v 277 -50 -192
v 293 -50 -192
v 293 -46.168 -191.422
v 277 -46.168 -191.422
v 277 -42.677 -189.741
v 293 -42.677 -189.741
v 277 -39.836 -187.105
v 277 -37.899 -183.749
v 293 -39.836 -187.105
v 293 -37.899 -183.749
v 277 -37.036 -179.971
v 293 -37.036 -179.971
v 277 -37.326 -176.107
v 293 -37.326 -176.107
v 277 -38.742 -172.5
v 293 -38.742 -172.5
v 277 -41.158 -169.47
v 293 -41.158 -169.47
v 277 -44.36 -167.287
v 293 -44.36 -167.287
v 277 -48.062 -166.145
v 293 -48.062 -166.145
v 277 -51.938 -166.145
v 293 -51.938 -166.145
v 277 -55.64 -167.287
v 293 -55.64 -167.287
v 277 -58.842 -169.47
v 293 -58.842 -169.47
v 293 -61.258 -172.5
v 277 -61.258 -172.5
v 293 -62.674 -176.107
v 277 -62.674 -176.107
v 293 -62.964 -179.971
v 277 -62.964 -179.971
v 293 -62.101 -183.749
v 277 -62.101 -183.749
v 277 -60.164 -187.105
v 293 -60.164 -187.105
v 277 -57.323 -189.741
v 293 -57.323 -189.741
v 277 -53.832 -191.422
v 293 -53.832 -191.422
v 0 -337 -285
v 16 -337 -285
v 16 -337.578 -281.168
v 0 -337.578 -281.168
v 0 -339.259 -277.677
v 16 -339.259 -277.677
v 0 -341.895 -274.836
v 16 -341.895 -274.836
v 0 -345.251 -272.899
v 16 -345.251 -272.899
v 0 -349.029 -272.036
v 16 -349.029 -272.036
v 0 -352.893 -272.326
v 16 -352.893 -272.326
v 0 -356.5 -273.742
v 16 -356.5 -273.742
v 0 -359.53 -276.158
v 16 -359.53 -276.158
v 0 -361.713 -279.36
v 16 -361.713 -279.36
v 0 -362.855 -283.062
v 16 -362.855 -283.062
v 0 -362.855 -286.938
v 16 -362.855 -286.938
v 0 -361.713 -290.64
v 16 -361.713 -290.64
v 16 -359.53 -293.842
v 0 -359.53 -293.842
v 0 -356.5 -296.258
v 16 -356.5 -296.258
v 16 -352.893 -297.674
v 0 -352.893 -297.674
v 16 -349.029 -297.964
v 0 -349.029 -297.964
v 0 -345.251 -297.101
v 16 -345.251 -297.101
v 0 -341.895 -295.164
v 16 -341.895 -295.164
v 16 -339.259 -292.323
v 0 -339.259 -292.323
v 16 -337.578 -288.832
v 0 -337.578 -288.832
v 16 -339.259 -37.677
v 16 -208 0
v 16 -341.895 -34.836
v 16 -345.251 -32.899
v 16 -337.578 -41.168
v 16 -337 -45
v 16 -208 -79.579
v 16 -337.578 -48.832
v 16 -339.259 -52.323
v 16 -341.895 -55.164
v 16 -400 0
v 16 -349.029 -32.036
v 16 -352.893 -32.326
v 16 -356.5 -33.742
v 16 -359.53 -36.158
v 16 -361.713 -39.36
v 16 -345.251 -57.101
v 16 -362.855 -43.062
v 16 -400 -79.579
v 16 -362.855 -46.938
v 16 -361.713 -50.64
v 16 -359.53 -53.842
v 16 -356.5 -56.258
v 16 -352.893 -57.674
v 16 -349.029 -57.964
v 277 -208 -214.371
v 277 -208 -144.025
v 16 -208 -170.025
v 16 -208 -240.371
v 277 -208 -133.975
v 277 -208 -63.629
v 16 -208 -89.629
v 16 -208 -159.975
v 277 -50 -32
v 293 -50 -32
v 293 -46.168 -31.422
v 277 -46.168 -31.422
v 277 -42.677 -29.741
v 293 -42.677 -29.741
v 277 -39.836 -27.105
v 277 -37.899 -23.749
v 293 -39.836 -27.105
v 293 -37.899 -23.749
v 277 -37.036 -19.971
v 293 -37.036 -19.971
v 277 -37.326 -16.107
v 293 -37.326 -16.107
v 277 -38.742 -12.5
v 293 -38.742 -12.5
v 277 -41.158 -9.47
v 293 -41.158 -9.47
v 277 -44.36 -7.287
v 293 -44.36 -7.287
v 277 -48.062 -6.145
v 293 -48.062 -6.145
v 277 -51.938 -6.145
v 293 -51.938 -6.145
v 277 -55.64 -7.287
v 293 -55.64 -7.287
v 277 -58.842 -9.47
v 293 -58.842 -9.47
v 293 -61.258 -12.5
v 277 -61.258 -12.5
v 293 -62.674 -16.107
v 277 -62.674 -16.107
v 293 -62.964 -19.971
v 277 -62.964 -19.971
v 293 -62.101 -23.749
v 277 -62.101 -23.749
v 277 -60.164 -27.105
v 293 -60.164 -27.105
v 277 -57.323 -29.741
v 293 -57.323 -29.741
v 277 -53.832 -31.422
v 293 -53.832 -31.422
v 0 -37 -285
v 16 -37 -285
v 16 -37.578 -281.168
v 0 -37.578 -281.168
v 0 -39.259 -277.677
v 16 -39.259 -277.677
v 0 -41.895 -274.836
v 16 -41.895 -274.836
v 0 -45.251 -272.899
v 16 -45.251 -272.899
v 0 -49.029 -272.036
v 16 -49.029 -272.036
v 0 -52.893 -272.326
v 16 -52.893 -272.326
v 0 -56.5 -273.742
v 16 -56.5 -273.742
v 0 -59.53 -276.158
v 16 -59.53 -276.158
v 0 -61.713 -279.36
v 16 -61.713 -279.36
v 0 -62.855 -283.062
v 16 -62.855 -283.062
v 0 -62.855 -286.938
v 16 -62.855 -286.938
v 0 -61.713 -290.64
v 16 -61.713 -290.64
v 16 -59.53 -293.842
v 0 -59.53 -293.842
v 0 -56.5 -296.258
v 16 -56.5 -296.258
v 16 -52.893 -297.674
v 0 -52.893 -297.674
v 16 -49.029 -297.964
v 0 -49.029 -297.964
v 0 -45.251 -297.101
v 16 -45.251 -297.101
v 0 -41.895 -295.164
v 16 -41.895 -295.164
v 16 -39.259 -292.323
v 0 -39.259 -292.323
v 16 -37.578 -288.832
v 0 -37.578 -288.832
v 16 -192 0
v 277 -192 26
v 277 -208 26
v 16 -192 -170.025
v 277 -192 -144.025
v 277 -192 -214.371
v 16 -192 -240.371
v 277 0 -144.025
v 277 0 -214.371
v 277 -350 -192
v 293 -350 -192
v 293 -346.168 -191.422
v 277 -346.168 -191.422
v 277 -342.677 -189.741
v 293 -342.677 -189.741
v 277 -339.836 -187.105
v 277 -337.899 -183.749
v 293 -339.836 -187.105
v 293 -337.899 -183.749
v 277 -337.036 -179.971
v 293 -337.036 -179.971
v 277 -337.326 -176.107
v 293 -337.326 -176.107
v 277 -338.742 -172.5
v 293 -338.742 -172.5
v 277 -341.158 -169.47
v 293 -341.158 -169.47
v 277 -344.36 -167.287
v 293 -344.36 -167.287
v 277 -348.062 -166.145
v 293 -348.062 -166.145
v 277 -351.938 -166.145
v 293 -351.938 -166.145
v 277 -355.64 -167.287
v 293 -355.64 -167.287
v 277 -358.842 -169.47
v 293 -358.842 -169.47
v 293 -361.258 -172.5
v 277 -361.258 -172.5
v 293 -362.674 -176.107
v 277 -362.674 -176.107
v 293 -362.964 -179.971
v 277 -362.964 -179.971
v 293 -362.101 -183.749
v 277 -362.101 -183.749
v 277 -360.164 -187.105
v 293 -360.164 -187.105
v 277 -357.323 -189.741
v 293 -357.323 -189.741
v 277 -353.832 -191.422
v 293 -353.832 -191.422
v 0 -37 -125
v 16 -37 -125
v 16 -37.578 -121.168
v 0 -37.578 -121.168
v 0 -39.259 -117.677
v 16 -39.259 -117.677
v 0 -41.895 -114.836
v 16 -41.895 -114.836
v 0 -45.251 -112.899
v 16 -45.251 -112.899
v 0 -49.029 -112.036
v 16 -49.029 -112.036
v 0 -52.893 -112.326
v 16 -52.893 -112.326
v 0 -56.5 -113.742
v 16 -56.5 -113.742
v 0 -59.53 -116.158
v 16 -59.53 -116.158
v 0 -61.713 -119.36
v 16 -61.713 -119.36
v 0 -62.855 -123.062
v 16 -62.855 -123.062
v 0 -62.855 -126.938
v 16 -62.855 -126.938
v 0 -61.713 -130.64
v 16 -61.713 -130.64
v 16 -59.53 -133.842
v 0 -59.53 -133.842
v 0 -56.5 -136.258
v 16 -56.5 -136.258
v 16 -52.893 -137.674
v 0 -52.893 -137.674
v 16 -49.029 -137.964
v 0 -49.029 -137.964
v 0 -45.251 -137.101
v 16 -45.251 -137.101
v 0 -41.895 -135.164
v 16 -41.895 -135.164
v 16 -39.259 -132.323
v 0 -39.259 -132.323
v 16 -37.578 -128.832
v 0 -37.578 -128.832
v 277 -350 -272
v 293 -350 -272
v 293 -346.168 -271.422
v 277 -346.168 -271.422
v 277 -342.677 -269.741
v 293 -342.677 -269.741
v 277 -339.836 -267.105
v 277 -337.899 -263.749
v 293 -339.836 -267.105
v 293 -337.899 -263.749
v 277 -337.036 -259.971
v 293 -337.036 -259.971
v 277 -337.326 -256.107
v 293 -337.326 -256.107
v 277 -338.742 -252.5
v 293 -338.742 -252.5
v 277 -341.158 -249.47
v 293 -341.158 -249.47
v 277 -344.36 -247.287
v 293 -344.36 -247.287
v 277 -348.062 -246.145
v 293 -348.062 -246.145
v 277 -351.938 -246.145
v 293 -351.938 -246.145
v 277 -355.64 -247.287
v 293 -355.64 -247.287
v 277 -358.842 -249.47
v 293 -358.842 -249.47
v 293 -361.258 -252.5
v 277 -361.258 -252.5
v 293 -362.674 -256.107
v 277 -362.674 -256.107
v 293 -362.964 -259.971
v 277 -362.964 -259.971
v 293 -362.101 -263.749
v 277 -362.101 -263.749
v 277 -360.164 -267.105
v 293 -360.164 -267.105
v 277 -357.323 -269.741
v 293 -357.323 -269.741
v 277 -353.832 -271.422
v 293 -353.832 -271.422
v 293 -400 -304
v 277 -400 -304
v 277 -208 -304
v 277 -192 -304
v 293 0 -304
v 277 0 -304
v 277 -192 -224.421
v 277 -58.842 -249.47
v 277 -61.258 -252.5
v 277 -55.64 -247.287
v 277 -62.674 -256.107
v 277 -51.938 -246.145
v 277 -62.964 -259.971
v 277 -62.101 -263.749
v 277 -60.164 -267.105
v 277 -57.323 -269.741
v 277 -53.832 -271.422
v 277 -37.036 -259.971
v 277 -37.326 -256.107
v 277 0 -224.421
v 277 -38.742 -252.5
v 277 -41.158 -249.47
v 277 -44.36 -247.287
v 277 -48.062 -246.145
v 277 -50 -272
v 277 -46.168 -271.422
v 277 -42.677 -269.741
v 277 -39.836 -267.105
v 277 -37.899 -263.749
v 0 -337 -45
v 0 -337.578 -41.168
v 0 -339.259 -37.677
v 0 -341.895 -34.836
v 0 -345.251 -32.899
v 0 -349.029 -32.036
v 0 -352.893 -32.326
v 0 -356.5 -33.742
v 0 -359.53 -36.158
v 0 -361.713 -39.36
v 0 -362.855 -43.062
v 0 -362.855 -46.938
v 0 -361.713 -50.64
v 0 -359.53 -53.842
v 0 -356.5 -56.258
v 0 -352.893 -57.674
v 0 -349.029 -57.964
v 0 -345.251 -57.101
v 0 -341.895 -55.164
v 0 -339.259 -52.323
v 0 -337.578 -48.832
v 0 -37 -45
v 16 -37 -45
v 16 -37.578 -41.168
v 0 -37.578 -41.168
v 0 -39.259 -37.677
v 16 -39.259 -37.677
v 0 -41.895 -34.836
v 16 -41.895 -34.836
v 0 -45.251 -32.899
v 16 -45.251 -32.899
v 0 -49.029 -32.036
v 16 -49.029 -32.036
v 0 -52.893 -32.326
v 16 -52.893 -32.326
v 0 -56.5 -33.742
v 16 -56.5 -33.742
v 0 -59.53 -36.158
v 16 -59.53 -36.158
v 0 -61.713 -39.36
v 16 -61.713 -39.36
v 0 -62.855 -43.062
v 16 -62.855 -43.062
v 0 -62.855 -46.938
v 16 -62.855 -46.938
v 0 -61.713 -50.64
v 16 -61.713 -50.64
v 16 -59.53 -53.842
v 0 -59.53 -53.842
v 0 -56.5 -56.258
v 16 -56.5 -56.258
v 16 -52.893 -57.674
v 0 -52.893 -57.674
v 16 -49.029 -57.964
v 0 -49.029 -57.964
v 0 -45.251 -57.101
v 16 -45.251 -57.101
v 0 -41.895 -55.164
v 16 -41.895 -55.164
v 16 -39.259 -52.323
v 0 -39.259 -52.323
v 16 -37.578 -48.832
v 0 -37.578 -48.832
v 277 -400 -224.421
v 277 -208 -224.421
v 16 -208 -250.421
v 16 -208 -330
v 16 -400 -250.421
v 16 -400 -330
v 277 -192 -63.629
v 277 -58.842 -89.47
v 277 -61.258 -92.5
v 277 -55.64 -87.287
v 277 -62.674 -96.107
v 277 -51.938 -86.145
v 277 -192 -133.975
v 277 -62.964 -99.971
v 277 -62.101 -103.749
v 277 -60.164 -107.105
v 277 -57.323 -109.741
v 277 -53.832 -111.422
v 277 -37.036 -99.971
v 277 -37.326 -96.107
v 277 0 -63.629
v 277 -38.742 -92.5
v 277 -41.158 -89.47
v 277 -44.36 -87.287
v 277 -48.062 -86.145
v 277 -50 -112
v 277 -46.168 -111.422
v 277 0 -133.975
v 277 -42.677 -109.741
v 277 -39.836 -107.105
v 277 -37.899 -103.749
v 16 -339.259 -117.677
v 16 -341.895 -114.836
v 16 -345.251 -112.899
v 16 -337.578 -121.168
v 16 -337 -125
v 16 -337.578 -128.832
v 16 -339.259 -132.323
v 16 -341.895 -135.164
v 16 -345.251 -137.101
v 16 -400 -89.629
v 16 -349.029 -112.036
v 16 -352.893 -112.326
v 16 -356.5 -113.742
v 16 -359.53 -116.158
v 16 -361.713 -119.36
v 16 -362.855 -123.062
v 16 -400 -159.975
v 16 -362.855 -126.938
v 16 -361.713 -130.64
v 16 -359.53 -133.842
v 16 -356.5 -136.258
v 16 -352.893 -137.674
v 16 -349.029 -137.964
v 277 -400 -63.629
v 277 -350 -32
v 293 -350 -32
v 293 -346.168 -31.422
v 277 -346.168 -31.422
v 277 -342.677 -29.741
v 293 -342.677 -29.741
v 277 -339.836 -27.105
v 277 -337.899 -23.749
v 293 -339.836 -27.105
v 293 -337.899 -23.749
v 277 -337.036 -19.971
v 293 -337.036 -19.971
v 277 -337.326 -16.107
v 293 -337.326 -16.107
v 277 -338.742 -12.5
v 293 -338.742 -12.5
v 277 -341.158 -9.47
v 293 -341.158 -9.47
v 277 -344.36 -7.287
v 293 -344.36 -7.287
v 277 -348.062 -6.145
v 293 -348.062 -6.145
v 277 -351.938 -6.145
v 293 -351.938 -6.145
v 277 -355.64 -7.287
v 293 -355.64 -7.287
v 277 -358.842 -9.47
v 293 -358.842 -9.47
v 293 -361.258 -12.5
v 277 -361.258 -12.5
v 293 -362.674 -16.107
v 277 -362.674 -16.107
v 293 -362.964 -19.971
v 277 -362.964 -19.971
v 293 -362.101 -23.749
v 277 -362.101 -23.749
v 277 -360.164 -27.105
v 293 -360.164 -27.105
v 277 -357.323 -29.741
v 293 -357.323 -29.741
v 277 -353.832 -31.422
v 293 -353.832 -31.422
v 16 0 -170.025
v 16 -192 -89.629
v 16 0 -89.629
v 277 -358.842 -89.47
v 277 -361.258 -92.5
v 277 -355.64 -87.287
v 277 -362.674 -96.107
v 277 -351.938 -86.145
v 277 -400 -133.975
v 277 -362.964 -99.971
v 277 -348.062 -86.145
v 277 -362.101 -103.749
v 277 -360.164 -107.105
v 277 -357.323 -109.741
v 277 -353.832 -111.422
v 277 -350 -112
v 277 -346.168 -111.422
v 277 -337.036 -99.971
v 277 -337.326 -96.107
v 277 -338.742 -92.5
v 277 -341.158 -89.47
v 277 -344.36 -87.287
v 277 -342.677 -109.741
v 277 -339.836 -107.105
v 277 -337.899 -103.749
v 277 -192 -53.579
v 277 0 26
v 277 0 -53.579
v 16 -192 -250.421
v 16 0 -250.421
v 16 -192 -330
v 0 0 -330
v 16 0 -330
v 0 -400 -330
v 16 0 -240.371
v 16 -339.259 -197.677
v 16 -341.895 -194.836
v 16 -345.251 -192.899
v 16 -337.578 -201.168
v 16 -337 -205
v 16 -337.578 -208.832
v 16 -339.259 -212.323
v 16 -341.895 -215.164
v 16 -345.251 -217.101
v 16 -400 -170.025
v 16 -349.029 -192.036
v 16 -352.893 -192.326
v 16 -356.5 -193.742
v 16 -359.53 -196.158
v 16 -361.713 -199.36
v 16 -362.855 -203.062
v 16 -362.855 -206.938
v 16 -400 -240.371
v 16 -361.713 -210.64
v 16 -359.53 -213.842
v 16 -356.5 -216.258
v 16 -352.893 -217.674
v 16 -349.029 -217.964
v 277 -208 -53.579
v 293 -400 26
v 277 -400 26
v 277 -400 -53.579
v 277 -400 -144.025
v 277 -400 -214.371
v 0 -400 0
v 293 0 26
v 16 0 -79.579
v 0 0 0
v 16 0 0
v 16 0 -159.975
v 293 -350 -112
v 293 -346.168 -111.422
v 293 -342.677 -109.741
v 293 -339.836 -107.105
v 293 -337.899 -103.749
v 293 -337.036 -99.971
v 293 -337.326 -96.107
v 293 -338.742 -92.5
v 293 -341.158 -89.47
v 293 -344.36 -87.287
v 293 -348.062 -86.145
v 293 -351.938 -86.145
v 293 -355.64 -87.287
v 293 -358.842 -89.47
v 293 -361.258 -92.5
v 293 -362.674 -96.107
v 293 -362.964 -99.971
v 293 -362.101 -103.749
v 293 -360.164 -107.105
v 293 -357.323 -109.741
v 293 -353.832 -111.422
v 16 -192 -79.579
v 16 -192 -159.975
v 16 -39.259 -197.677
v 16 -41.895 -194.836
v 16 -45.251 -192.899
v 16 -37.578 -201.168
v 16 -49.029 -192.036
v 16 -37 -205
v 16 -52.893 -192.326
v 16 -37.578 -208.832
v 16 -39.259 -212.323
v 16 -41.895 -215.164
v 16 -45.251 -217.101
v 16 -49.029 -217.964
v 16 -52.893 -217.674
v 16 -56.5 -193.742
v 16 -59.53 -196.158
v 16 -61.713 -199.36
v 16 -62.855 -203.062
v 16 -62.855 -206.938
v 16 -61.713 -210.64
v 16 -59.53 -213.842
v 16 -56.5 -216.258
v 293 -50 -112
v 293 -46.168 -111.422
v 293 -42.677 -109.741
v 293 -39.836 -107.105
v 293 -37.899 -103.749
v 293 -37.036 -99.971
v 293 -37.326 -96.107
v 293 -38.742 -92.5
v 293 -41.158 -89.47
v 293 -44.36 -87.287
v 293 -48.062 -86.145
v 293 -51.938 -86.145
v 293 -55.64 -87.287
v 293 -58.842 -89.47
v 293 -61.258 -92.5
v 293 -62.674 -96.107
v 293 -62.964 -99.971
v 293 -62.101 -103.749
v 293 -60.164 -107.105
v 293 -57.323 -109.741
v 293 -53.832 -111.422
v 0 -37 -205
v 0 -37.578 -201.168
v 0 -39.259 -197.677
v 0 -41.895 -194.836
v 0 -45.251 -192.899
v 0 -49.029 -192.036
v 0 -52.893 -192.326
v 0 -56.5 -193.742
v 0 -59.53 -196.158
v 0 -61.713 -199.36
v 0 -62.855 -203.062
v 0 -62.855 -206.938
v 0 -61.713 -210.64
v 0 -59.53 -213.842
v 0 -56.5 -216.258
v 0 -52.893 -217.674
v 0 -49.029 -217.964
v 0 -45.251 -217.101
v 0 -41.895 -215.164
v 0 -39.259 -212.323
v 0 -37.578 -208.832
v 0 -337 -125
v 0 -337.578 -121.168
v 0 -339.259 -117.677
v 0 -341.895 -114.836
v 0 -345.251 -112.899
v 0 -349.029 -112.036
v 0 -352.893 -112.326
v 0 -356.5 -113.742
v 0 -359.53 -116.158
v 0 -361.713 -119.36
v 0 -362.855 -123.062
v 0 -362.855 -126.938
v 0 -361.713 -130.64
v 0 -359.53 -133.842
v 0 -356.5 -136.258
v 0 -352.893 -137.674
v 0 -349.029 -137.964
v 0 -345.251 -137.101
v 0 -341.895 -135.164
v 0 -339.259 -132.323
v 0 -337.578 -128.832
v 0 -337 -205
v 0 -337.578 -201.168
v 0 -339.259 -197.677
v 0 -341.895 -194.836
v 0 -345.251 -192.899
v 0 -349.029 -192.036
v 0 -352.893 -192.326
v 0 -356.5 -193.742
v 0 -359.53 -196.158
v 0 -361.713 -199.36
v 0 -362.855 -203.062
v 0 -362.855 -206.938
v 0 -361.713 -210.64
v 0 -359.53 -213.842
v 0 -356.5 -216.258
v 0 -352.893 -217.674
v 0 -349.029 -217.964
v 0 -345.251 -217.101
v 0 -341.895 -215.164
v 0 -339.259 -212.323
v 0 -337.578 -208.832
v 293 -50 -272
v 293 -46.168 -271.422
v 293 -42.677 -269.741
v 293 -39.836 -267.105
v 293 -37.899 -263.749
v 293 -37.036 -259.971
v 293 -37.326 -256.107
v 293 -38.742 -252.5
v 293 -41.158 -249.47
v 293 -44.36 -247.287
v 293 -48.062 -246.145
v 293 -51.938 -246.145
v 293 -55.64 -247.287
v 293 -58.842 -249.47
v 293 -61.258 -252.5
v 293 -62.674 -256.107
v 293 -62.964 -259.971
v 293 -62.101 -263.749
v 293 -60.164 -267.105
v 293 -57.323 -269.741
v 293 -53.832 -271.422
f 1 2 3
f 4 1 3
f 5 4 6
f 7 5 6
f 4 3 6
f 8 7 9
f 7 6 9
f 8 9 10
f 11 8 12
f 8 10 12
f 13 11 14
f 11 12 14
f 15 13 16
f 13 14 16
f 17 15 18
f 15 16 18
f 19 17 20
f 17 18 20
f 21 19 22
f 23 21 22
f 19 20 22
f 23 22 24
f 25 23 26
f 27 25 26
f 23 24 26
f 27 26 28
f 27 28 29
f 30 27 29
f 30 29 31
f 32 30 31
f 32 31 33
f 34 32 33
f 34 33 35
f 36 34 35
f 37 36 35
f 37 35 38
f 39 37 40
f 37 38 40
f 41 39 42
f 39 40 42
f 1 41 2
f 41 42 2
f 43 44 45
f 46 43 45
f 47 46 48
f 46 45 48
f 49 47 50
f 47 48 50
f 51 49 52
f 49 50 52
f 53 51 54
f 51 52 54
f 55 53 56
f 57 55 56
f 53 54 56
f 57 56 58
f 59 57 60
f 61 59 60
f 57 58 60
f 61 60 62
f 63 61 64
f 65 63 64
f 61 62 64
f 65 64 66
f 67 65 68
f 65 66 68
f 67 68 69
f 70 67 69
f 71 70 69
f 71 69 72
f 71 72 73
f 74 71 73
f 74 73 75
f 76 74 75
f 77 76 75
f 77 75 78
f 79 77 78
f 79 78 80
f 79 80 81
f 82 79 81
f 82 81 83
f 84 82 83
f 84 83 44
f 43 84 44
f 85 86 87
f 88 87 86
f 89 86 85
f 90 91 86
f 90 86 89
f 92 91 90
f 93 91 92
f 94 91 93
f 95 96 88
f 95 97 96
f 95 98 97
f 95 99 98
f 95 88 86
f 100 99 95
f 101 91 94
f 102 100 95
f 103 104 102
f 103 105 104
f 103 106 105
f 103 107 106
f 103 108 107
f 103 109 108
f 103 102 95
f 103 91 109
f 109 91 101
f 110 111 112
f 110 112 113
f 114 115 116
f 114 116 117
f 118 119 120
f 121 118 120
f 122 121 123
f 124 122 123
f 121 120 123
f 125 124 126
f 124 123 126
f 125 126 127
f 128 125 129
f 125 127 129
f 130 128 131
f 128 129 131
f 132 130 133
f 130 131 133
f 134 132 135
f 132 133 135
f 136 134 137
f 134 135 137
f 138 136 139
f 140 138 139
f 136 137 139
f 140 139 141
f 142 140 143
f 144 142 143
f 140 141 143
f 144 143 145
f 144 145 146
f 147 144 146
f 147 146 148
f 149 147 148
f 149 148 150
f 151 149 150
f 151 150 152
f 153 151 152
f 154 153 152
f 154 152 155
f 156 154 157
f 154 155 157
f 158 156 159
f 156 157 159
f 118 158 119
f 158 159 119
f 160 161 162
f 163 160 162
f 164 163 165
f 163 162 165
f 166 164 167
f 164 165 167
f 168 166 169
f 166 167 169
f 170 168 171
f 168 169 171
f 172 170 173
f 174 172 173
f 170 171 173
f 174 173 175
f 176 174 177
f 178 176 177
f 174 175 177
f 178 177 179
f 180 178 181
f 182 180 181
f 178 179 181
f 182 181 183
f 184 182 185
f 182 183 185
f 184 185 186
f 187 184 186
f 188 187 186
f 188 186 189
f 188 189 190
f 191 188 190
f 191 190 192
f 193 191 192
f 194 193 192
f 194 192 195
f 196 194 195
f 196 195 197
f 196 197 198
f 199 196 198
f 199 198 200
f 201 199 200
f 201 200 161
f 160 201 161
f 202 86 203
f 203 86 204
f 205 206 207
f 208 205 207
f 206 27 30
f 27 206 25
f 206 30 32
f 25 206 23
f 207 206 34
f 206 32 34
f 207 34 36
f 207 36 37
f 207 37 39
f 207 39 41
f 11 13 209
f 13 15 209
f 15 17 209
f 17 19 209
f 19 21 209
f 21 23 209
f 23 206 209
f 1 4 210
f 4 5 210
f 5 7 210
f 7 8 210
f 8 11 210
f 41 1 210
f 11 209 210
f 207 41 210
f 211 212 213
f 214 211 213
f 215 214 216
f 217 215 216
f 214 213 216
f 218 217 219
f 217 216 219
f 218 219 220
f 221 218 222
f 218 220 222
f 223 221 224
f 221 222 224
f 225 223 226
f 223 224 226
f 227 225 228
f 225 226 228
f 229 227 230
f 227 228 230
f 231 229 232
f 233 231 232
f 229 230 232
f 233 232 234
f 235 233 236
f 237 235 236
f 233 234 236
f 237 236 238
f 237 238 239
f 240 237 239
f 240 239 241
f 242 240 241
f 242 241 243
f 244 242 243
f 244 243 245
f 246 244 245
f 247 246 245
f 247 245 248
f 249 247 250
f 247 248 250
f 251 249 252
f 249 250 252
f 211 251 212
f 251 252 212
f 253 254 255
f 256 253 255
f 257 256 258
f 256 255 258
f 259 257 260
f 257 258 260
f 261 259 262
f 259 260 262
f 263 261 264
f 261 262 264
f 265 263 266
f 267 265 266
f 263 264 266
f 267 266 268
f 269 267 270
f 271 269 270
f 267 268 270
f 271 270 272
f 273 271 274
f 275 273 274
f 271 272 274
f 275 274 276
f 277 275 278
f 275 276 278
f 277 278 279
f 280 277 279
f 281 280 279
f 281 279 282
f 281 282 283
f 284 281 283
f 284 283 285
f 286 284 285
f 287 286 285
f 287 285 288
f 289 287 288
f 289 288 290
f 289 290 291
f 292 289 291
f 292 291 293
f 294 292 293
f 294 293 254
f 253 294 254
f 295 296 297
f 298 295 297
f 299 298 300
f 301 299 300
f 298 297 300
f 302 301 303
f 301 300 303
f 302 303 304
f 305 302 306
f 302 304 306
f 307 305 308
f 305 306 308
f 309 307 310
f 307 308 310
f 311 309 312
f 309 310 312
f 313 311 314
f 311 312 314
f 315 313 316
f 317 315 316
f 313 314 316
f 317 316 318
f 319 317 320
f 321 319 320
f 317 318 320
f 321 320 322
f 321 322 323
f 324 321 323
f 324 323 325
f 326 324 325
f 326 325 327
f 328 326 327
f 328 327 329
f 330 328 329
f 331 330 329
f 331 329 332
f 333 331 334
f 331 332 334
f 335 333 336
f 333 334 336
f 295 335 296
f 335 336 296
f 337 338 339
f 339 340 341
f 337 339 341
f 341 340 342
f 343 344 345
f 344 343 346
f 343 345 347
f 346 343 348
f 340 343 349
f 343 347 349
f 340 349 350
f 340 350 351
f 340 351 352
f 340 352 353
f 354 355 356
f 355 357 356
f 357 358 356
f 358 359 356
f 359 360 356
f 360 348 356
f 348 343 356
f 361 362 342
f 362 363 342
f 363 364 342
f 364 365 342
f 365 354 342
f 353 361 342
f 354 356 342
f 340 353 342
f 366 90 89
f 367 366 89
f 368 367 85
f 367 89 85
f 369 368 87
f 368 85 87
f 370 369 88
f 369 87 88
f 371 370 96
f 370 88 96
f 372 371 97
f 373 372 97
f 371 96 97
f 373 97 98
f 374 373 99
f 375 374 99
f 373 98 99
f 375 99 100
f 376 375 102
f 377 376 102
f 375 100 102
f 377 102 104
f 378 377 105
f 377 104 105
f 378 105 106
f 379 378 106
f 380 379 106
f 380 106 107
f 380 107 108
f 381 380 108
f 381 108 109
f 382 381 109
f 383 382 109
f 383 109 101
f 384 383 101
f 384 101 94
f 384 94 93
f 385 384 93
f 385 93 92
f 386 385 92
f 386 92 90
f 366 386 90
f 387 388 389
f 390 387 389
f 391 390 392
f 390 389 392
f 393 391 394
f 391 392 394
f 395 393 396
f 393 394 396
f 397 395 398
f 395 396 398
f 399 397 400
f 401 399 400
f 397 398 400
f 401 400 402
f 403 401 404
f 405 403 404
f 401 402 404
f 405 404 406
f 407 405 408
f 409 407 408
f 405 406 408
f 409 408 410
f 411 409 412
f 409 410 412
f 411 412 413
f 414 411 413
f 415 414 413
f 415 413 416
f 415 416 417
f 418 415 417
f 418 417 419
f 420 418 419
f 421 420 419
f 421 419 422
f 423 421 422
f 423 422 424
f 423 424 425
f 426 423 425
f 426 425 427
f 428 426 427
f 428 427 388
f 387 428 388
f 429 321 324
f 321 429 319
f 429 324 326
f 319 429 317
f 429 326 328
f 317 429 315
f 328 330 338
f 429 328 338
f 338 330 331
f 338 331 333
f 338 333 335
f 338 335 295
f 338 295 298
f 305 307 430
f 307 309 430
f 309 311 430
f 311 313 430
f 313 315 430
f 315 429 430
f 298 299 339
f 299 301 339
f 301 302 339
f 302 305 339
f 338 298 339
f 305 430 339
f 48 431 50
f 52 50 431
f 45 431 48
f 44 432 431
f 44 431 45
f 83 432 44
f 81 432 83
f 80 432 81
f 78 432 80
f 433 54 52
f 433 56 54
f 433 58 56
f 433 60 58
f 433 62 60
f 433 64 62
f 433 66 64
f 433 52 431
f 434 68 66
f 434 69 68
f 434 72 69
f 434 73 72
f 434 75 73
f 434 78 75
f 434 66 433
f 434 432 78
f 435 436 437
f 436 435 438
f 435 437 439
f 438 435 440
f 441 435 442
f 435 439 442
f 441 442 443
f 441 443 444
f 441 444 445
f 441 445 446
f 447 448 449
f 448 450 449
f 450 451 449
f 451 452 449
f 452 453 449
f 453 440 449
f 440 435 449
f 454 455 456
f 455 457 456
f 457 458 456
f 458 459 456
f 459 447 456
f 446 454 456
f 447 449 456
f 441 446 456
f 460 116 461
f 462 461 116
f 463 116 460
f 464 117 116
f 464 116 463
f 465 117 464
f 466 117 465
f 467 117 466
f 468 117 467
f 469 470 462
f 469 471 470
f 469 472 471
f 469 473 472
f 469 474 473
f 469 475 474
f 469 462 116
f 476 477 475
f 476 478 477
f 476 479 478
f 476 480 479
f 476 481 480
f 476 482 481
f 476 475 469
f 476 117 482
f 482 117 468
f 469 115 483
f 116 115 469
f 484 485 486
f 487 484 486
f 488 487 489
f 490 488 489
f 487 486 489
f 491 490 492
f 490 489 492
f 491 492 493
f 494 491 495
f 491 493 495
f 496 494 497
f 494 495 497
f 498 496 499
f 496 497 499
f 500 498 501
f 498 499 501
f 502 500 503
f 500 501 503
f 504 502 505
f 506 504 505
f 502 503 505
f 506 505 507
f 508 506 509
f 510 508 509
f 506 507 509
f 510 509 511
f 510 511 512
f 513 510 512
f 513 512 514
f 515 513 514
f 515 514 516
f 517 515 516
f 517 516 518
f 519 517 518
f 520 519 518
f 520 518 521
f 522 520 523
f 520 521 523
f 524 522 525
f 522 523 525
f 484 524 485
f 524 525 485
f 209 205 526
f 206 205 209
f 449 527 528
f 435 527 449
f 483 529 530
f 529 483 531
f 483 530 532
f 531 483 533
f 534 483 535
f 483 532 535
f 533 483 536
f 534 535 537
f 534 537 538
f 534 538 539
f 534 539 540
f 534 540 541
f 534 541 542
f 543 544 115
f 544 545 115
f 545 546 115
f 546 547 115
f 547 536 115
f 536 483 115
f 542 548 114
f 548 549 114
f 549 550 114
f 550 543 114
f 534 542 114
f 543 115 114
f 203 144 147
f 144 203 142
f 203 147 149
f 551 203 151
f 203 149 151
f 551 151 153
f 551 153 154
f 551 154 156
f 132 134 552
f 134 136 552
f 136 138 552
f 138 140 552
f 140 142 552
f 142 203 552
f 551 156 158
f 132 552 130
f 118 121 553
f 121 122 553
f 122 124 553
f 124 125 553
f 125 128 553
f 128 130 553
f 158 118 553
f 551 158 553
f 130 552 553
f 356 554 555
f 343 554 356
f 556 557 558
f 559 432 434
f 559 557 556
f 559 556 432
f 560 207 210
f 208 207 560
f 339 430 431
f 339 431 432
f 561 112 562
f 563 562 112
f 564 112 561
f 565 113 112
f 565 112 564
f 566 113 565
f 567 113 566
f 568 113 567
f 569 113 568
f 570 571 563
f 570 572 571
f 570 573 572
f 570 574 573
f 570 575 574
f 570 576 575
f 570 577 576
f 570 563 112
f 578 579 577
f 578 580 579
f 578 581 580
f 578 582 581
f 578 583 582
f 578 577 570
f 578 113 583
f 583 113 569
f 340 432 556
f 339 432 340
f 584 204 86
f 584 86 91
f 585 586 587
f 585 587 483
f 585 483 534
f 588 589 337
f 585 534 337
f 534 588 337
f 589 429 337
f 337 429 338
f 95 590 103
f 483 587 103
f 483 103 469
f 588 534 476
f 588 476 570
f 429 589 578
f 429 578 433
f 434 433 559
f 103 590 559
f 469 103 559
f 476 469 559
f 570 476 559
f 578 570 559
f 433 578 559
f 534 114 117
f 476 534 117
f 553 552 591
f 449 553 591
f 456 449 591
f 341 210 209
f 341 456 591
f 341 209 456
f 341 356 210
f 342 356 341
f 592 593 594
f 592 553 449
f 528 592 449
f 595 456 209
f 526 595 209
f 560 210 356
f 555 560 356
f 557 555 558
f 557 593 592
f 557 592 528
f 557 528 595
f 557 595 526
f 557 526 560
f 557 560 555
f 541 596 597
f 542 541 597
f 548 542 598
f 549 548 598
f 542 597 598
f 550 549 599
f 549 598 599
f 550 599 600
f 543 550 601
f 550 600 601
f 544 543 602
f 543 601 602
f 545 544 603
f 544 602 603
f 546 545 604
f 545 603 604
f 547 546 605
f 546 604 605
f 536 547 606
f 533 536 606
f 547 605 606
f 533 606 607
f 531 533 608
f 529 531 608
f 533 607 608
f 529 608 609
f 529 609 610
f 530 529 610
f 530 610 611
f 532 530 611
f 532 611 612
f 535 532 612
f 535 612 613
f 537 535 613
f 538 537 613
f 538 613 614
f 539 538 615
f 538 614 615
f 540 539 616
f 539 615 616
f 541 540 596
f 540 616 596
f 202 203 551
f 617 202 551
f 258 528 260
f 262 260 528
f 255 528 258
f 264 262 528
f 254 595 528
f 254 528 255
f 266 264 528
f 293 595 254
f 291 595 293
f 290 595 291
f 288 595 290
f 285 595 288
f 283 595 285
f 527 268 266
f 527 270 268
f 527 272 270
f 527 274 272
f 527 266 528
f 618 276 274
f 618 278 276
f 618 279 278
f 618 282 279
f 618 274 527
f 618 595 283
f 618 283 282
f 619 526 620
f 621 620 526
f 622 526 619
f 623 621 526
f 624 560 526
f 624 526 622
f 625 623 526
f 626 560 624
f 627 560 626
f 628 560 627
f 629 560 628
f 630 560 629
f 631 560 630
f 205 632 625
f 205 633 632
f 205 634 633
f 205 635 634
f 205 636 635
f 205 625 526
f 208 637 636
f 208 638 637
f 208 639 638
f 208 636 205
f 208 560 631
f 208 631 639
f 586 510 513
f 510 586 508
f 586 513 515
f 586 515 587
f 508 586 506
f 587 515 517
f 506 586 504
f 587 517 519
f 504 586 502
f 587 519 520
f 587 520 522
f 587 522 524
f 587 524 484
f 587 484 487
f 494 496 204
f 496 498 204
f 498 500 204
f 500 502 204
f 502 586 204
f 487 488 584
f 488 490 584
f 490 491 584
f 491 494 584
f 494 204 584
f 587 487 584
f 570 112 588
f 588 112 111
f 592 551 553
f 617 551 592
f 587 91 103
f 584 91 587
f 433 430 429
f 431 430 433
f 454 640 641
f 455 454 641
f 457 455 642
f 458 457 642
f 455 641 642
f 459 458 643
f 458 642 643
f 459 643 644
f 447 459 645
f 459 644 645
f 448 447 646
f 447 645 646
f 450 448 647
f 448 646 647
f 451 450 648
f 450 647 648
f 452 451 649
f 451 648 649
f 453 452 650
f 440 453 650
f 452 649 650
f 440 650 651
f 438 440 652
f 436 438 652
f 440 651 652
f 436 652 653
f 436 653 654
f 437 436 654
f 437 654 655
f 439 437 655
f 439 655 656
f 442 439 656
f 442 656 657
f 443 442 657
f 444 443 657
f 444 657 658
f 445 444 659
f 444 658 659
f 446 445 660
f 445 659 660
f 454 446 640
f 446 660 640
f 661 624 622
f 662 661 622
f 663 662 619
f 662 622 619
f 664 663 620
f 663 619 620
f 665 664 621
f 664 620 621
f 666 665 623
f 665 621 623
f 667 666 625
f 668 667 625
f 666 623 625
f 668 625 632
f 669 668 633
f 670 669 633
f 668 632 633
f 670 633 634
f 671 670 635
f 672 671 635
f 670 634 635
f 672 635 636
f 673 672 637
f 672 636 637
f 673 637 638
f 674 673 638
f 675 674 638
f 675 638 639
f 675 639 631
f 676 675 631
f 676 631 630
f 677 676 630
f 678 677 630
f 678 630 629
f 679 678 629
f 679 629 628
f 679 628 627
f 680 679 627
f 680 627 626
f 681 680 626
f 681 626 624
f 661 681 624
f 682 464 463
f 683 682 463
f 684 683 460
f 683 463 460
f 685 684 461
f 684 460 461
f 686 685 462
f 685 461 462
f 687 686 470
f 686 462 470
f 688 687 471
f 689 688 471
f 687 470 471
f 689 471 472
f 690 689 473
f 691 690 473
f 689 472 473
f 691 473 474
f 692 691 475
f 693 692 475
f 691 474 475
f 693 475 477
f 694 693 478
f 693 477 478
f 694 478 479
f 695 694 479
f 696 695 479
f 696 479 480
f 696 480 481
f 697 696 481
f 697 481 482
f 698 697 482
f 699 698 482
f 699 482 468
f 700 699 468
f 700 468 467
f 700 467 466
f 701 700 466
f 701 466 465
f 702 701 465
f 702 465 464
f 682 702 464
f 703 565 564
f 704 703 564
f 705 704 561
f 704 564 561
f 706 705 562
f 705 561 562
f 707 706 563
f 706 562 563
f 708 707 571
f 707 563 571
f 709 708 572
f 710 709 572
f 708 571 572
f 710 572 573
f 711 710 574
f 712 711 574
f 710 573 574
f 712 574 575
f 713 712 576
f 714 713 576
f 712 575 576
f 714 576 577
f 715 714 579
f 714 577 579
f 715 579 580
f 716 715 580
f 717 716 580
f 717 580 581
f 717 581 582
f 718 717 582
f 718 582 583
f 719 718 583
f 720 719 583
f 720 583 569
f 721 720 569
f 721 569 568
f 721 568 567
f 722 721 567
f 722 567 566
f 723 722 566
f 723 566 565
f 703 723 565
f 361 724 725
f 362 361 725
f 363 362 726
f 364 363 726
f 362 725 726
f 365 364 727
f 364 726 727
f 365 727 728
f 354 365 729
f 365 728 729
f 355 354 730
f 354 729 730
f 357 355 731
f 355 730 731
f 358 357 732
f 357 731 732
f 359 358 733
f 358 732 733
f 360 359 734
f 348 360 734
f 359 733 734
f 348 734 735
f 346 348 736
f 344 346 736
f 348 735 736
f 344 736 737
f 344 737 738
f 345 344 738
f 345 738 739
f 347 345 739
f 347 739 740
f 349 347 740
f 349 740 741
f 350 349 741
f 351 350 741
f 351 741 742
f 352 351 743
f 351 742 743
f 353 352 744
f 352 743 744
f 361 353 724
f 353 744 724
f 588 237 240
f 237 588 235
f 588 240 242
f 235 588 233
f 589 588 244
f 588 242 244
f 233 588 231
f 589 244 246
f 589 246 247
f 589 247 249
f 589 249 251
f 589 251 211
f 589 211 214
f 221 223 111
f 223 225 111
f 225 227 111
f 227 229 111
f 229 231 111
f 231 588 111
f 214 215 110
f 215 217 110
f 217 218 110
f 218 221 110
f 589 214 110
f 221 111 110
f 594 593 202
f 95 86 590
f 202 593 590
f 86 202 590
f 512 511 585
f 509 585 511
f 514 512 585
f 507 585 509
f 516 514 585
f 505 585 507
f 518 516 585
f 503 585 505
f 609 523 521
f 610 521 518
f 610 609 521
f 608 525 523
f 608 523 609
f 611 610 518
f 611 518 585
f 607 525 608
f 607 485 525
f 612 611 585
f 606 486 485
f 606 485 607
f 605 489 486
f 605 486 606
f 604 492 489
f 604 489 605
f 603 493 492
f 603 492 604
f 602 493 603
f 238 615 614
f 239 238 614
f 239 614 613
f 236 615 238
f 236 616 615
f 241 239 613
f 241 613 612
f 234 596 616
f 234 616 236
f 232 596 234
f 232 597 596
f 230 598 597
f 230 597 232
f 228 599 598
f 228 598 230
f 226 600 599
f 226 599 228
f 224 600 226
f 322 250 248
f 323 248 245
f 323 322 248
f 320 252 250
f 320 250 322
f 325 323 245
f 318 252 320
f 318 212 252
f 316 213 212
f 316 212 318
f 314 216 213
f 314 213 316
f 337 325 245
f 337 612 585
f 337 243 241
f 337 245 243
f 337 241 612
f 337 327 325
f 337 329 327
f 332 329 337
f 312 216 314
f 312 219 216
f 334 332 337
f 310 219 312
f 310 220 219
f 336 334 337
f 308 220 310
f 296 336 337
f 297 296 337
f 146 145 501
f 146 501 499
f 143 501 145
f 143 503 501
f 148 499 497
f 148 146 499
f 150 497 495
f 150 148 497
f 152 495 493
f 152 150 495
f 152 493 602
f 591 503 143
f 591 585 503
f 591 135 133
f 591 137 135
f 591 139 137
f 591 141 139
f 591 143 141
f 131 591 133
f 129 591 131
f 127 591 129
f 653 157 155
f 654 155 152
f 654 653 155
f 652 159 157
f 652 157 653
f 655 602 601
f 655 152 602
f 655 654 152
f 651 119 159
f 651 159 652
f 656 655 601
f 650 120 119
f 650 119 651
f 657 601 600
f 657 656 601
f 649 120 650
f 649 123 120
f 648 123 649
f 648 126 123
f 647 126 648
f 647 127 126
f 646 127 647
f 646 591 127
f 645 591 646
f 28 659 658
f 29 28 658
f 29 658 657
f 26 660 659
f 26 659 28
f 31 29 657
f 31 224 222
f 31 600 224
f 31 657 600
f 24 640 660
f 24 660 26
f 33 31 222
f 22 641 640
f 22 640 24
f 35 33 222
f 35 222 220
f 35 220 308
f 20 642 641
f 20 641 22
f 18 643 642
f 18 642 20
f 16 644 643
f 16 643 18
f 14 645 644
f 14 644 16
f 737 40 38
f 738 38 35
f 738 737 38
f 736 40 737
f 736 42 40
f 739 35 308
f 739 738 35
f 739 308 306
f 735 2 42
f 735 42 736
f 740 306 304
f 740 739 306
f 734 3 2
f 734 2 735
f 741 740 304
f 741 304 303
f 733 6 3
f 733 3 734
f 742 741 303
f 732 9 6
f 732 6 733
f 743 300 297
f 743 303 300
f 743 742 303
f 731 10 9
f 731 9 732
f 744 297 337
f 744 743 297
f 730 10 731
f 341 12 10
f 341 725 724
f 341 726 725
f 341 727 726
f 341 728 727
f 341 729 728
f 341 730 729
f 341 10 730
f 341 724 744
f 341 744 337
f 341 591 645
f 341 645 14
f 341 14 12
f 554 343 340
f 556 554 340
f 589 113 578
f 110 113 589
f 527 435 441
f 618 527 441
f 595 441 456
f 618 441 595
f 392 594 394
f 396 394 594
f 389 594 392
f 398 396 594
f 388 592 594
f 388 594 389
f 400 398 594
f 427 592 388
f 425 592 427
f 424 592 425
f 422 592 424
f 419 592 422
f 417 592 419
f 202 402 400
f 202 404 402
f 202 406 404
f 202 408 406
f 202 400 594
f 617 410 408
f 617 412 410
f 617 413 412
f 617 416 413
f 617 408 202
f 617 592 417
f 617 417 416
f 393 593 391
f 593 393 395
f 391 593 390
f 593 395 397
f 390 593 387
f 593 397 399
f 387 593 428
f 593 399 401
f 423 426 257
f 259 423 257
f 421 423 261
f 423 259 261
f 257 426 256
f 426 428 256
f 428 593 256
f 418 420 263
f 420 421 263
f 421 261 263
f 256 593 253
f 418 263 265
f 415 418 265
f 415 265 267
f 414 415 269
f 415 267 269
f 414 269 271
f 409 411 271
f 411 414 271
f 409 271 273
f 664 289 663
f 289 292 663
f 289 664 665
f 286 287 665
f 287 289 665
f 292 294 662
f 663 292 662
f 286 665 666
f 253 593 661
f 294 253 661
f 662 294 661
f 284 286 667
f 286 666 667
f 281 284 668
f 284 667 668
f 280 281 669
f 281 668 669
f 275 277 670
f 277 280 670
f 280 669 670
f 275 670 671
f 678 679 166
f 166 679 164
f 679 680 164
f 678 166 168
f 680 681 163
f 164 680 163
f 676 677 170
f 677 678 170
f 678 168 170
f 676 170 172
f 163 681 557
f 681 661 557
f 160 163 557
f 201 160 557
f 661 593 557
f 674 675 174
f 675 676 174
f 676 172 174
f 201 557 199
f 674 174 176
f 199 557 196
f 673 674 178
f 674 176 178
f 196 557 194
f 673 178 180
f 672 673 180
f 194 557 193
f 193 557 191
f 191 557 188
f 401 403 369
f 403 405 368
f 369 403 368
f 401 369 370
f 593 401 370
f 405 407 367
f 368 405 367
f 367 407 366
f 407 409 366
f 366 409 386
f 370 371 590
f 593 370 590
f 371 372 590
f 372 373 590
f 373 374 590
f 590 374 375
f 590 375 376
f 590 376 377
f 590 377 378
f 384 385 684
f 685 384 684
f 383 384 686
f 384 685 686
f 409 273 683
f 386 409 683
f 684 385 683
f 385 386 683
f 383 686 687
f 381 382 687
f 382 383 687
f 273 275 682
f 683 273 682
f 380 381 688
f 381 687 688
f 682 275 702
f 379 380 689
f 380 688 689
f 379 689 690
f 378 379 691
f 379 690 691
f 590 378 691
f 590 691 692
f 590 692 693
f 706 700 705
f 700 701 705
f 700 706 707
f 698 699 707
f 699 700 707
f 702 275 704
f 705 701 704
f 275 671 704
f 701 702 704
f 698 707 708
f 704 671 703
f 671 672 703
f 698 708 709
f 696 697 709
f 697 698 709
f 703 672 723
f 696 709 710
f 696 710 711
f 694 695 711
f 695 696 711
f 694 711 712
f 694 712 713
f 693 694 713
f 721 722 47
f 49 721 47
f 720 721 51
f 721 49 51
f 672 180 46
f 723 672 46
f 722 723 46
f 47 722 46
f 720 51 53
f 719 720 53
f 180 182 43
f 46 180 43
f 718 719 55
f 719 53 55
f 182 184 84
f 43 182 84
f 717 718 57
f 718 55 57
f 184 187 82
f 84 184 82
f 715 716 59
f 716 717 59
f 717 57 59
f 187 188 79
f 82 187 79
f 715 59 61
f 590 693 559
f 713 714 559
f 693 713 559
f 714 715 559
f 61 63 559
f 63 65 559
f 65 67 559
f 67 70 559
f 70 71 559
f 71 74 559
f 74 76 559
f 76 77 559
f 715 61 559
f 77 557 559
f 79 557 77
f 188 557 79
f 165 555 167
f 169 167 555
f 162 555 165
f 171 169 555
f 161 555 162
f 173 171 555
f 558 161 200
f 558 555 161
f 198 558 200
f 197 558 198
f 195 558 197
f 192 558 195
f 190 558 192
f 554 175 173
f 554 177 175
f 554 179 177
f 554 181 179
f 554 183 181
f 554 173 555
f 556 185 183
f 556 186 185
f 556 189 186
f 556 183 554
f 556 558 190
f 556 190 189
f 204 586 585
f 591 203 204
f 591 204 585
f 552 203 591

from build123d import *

# Parameters (mm, degrees)
SKETCH_7_W                  = 400
SKETCH_7_H                  = 330
EXTRUDE_6_DEPTH             = 16
SKETCH_8_R                  = 13
CUT_EXTRUDE_2_DEPTH         = 519.802467226
PATTERN_LINEAR_1_COUNT      = 2
PATTERN_LINEAR_1_PITCH      = 300
PATTERN_LINEAR_1_COUNT_DIR2 = 4
PATTERN_LINEAR_1_PITCH_DIR2 = 80
SKETCH_9_W                  = 382
SKETCH_9_H                  = 16
EXTRUDE_7_DEPTH             = 261
CUT_EXTRUDE_3_DEPTH         = 497.718229986
EXTRUDE_8_DEPTH             = 192
EXTRUDE_9_DEPTH             = 192
SKETCH_13_W                 = 330
SKETCH_13_H                 = 400
EXTRUDE_10_DEPTH            = 16
SKETCH_14_R                 = 13
CUT_EXTRUDE_4_DEPTH         = 16
PATTERN_LINEAR_2_COUNT      = 4
PATTERN_LINEAR_2_PITCH      = 80
PATTERN_LINEAR_2_COUNT_DIR2 = 2
PATTERN_LINEAR_2_PITCH_DIR2 = 300


with BuildPart() as part:
    # 草图7 → 凸台-拉伸6 (new body)
    with BuildSketch(Plane(origin=(0, 0, 0), x_dir=(0, -1, 0), z_dir=(1, 0, 0))):
        with Locations((200, 165)):
            Rectangle(SKETCH_7_W, SKETCH_7_H)
    extrude(amount=EXTRUDE_6_DEPTH)

    # 草图8 → 切除-拉伸2 (cut, through all)
    with BuildSketch(Plane(origin=(16, 0, 0), x_dir=(0, -1, 0), z_dir=(1, 0, 0))):
        with Locations(Location((50, 45, 0), (0, 0, 180))):
            Circle(SKETCH_8_R)
    cut_extrude_2 = extrude(amount=-CUT_EXTRUDE_2_DEPTH, mode=Mode.SUBTRACT)

    # 阵列(线性)1: Cut-Extrude 2 2 × 4
    with Locations(*[(0, -i * PATTERN_LINEAR_1_PITCH, -j * PATTERN_LINEAR_1_PITCH_DIR2) for i in range(PATTERN_LINEAR_1_COUNT) for j in range(PATTERN_LINEAR_1_COUNT_DIR2) if (i, j) != (0, 0)]):
        add(cut_extrude_2, mode=Mode.SUBTRACT)

    # 草图9 → 凸台-拉伸7 (add)
    with BuildSketch(Plane(origin=(16, 0, 0), x_dir=(0, 0, -1), z_dir=(1, 0, 0))):
        with Locations((165, -200)):
            Rectangle(SKETCH_9_W, SKETCH_9_H)
    extrude(amount=EXTRUDE_7_DEPTH)

    # 草图10 → 切除-拉伸3 (cut, through all)
    with BuildSketch(Plane(origin=(0, -208, 0), x_dir=(-1, 0, 0), z_dir=(0, -1, 0))):
        Polygon((-16, -26), (-16, 0), (-277, -26), align=None)
        Polygon((-16, 330), (-277, 304), (-277, 356), (-16, 356), align=None)
    extrude(amount=-CUT_EXTRUDE_3_DEPTH, mode=Mode.SUBTRACT)

    # 草图11 → 凸台-拉伸8 (add)
    with BuildSketch(Plane.XZ.offset(208)):
        Polygon((16, -79.579291616), (277, -53.579291616), (277, -63.62878672), (16, -89.62878672), align=None)
        Polygon((16, -170.024747552), (277, -144.024747552), (277, -133.975252448), (16, -159.975252448), align=None)
        Polygon((16, -240.37121328), (277, -214.37121328), (277, -224.420708384), (16, -250.420708384), align=None)
    extrude(amount=EXTRUDE_8_DEPTH)

    # 草图12 → 凸台-拉伸9 (add)
    with BuildSketch(Plane(origin=(0, -192, 0), x_dir=(1, 0, 0), z_dir=(0, 1, 0))):
        Polygon((16, 79.579291616), (16, 89.62878672), (277, 63.62878672), (277, 53.579291616), align=None)
        Polygon((16, 159.975252448), (16, 170.024747552), (277, 144.024747552), (277, 133.975252448), align=None)
        Polygon((16, 240.37121328), (16, 250.420708384), (277, 224.420708384), (277, 214.37121328), align=None)
    extrude(amount=EXTRUDE_9_DEPTH)

    # 草图13 → 凸台-拉伸10 (add)
    with BuildSketch(Plane(origin=(277, 0, 0), x_dir=(0, 0, -1), z_dir=(1, 0, 0))):
        with Locations((139, -200)):
            Rectangle(SKETCH_13_W, SKETCH_13_H)
    extrude(amount=EXTRUDE_10_DEPTH)

    # 草图14 → 切除-拉伸4 (cut)
    with BuildSketch(Plane(origin=(293, 0, 0), x_dir=(0, 0, -1), z_dir=(1, 0, 0))):
        with Locations((19, -350)):
            Circle(SKETCH_14_R)
    cut_extrude_4 = extrude(amount=-CUT_EXTRUDE_4_DEPTH, mode=Mode.SUBTRACT)

    # 阵列(线性)2: Cut-Extrude 4 4 × 2
    with Locations(*[(0, j * PATTERN_LINEAR_2_PITCH_DIR2, -i * PATTERN_LINEAR_2_PITCH) for i in range(PATTERN_LINEAR_2_COUNT) for j in range(PATTERN_LINEAR_2_COUNT_DIR2) if (i, j) != (0, 0)]):
        add(cut_extrude_4, mode=Mode.SUBTRACT)


solid = part.part
